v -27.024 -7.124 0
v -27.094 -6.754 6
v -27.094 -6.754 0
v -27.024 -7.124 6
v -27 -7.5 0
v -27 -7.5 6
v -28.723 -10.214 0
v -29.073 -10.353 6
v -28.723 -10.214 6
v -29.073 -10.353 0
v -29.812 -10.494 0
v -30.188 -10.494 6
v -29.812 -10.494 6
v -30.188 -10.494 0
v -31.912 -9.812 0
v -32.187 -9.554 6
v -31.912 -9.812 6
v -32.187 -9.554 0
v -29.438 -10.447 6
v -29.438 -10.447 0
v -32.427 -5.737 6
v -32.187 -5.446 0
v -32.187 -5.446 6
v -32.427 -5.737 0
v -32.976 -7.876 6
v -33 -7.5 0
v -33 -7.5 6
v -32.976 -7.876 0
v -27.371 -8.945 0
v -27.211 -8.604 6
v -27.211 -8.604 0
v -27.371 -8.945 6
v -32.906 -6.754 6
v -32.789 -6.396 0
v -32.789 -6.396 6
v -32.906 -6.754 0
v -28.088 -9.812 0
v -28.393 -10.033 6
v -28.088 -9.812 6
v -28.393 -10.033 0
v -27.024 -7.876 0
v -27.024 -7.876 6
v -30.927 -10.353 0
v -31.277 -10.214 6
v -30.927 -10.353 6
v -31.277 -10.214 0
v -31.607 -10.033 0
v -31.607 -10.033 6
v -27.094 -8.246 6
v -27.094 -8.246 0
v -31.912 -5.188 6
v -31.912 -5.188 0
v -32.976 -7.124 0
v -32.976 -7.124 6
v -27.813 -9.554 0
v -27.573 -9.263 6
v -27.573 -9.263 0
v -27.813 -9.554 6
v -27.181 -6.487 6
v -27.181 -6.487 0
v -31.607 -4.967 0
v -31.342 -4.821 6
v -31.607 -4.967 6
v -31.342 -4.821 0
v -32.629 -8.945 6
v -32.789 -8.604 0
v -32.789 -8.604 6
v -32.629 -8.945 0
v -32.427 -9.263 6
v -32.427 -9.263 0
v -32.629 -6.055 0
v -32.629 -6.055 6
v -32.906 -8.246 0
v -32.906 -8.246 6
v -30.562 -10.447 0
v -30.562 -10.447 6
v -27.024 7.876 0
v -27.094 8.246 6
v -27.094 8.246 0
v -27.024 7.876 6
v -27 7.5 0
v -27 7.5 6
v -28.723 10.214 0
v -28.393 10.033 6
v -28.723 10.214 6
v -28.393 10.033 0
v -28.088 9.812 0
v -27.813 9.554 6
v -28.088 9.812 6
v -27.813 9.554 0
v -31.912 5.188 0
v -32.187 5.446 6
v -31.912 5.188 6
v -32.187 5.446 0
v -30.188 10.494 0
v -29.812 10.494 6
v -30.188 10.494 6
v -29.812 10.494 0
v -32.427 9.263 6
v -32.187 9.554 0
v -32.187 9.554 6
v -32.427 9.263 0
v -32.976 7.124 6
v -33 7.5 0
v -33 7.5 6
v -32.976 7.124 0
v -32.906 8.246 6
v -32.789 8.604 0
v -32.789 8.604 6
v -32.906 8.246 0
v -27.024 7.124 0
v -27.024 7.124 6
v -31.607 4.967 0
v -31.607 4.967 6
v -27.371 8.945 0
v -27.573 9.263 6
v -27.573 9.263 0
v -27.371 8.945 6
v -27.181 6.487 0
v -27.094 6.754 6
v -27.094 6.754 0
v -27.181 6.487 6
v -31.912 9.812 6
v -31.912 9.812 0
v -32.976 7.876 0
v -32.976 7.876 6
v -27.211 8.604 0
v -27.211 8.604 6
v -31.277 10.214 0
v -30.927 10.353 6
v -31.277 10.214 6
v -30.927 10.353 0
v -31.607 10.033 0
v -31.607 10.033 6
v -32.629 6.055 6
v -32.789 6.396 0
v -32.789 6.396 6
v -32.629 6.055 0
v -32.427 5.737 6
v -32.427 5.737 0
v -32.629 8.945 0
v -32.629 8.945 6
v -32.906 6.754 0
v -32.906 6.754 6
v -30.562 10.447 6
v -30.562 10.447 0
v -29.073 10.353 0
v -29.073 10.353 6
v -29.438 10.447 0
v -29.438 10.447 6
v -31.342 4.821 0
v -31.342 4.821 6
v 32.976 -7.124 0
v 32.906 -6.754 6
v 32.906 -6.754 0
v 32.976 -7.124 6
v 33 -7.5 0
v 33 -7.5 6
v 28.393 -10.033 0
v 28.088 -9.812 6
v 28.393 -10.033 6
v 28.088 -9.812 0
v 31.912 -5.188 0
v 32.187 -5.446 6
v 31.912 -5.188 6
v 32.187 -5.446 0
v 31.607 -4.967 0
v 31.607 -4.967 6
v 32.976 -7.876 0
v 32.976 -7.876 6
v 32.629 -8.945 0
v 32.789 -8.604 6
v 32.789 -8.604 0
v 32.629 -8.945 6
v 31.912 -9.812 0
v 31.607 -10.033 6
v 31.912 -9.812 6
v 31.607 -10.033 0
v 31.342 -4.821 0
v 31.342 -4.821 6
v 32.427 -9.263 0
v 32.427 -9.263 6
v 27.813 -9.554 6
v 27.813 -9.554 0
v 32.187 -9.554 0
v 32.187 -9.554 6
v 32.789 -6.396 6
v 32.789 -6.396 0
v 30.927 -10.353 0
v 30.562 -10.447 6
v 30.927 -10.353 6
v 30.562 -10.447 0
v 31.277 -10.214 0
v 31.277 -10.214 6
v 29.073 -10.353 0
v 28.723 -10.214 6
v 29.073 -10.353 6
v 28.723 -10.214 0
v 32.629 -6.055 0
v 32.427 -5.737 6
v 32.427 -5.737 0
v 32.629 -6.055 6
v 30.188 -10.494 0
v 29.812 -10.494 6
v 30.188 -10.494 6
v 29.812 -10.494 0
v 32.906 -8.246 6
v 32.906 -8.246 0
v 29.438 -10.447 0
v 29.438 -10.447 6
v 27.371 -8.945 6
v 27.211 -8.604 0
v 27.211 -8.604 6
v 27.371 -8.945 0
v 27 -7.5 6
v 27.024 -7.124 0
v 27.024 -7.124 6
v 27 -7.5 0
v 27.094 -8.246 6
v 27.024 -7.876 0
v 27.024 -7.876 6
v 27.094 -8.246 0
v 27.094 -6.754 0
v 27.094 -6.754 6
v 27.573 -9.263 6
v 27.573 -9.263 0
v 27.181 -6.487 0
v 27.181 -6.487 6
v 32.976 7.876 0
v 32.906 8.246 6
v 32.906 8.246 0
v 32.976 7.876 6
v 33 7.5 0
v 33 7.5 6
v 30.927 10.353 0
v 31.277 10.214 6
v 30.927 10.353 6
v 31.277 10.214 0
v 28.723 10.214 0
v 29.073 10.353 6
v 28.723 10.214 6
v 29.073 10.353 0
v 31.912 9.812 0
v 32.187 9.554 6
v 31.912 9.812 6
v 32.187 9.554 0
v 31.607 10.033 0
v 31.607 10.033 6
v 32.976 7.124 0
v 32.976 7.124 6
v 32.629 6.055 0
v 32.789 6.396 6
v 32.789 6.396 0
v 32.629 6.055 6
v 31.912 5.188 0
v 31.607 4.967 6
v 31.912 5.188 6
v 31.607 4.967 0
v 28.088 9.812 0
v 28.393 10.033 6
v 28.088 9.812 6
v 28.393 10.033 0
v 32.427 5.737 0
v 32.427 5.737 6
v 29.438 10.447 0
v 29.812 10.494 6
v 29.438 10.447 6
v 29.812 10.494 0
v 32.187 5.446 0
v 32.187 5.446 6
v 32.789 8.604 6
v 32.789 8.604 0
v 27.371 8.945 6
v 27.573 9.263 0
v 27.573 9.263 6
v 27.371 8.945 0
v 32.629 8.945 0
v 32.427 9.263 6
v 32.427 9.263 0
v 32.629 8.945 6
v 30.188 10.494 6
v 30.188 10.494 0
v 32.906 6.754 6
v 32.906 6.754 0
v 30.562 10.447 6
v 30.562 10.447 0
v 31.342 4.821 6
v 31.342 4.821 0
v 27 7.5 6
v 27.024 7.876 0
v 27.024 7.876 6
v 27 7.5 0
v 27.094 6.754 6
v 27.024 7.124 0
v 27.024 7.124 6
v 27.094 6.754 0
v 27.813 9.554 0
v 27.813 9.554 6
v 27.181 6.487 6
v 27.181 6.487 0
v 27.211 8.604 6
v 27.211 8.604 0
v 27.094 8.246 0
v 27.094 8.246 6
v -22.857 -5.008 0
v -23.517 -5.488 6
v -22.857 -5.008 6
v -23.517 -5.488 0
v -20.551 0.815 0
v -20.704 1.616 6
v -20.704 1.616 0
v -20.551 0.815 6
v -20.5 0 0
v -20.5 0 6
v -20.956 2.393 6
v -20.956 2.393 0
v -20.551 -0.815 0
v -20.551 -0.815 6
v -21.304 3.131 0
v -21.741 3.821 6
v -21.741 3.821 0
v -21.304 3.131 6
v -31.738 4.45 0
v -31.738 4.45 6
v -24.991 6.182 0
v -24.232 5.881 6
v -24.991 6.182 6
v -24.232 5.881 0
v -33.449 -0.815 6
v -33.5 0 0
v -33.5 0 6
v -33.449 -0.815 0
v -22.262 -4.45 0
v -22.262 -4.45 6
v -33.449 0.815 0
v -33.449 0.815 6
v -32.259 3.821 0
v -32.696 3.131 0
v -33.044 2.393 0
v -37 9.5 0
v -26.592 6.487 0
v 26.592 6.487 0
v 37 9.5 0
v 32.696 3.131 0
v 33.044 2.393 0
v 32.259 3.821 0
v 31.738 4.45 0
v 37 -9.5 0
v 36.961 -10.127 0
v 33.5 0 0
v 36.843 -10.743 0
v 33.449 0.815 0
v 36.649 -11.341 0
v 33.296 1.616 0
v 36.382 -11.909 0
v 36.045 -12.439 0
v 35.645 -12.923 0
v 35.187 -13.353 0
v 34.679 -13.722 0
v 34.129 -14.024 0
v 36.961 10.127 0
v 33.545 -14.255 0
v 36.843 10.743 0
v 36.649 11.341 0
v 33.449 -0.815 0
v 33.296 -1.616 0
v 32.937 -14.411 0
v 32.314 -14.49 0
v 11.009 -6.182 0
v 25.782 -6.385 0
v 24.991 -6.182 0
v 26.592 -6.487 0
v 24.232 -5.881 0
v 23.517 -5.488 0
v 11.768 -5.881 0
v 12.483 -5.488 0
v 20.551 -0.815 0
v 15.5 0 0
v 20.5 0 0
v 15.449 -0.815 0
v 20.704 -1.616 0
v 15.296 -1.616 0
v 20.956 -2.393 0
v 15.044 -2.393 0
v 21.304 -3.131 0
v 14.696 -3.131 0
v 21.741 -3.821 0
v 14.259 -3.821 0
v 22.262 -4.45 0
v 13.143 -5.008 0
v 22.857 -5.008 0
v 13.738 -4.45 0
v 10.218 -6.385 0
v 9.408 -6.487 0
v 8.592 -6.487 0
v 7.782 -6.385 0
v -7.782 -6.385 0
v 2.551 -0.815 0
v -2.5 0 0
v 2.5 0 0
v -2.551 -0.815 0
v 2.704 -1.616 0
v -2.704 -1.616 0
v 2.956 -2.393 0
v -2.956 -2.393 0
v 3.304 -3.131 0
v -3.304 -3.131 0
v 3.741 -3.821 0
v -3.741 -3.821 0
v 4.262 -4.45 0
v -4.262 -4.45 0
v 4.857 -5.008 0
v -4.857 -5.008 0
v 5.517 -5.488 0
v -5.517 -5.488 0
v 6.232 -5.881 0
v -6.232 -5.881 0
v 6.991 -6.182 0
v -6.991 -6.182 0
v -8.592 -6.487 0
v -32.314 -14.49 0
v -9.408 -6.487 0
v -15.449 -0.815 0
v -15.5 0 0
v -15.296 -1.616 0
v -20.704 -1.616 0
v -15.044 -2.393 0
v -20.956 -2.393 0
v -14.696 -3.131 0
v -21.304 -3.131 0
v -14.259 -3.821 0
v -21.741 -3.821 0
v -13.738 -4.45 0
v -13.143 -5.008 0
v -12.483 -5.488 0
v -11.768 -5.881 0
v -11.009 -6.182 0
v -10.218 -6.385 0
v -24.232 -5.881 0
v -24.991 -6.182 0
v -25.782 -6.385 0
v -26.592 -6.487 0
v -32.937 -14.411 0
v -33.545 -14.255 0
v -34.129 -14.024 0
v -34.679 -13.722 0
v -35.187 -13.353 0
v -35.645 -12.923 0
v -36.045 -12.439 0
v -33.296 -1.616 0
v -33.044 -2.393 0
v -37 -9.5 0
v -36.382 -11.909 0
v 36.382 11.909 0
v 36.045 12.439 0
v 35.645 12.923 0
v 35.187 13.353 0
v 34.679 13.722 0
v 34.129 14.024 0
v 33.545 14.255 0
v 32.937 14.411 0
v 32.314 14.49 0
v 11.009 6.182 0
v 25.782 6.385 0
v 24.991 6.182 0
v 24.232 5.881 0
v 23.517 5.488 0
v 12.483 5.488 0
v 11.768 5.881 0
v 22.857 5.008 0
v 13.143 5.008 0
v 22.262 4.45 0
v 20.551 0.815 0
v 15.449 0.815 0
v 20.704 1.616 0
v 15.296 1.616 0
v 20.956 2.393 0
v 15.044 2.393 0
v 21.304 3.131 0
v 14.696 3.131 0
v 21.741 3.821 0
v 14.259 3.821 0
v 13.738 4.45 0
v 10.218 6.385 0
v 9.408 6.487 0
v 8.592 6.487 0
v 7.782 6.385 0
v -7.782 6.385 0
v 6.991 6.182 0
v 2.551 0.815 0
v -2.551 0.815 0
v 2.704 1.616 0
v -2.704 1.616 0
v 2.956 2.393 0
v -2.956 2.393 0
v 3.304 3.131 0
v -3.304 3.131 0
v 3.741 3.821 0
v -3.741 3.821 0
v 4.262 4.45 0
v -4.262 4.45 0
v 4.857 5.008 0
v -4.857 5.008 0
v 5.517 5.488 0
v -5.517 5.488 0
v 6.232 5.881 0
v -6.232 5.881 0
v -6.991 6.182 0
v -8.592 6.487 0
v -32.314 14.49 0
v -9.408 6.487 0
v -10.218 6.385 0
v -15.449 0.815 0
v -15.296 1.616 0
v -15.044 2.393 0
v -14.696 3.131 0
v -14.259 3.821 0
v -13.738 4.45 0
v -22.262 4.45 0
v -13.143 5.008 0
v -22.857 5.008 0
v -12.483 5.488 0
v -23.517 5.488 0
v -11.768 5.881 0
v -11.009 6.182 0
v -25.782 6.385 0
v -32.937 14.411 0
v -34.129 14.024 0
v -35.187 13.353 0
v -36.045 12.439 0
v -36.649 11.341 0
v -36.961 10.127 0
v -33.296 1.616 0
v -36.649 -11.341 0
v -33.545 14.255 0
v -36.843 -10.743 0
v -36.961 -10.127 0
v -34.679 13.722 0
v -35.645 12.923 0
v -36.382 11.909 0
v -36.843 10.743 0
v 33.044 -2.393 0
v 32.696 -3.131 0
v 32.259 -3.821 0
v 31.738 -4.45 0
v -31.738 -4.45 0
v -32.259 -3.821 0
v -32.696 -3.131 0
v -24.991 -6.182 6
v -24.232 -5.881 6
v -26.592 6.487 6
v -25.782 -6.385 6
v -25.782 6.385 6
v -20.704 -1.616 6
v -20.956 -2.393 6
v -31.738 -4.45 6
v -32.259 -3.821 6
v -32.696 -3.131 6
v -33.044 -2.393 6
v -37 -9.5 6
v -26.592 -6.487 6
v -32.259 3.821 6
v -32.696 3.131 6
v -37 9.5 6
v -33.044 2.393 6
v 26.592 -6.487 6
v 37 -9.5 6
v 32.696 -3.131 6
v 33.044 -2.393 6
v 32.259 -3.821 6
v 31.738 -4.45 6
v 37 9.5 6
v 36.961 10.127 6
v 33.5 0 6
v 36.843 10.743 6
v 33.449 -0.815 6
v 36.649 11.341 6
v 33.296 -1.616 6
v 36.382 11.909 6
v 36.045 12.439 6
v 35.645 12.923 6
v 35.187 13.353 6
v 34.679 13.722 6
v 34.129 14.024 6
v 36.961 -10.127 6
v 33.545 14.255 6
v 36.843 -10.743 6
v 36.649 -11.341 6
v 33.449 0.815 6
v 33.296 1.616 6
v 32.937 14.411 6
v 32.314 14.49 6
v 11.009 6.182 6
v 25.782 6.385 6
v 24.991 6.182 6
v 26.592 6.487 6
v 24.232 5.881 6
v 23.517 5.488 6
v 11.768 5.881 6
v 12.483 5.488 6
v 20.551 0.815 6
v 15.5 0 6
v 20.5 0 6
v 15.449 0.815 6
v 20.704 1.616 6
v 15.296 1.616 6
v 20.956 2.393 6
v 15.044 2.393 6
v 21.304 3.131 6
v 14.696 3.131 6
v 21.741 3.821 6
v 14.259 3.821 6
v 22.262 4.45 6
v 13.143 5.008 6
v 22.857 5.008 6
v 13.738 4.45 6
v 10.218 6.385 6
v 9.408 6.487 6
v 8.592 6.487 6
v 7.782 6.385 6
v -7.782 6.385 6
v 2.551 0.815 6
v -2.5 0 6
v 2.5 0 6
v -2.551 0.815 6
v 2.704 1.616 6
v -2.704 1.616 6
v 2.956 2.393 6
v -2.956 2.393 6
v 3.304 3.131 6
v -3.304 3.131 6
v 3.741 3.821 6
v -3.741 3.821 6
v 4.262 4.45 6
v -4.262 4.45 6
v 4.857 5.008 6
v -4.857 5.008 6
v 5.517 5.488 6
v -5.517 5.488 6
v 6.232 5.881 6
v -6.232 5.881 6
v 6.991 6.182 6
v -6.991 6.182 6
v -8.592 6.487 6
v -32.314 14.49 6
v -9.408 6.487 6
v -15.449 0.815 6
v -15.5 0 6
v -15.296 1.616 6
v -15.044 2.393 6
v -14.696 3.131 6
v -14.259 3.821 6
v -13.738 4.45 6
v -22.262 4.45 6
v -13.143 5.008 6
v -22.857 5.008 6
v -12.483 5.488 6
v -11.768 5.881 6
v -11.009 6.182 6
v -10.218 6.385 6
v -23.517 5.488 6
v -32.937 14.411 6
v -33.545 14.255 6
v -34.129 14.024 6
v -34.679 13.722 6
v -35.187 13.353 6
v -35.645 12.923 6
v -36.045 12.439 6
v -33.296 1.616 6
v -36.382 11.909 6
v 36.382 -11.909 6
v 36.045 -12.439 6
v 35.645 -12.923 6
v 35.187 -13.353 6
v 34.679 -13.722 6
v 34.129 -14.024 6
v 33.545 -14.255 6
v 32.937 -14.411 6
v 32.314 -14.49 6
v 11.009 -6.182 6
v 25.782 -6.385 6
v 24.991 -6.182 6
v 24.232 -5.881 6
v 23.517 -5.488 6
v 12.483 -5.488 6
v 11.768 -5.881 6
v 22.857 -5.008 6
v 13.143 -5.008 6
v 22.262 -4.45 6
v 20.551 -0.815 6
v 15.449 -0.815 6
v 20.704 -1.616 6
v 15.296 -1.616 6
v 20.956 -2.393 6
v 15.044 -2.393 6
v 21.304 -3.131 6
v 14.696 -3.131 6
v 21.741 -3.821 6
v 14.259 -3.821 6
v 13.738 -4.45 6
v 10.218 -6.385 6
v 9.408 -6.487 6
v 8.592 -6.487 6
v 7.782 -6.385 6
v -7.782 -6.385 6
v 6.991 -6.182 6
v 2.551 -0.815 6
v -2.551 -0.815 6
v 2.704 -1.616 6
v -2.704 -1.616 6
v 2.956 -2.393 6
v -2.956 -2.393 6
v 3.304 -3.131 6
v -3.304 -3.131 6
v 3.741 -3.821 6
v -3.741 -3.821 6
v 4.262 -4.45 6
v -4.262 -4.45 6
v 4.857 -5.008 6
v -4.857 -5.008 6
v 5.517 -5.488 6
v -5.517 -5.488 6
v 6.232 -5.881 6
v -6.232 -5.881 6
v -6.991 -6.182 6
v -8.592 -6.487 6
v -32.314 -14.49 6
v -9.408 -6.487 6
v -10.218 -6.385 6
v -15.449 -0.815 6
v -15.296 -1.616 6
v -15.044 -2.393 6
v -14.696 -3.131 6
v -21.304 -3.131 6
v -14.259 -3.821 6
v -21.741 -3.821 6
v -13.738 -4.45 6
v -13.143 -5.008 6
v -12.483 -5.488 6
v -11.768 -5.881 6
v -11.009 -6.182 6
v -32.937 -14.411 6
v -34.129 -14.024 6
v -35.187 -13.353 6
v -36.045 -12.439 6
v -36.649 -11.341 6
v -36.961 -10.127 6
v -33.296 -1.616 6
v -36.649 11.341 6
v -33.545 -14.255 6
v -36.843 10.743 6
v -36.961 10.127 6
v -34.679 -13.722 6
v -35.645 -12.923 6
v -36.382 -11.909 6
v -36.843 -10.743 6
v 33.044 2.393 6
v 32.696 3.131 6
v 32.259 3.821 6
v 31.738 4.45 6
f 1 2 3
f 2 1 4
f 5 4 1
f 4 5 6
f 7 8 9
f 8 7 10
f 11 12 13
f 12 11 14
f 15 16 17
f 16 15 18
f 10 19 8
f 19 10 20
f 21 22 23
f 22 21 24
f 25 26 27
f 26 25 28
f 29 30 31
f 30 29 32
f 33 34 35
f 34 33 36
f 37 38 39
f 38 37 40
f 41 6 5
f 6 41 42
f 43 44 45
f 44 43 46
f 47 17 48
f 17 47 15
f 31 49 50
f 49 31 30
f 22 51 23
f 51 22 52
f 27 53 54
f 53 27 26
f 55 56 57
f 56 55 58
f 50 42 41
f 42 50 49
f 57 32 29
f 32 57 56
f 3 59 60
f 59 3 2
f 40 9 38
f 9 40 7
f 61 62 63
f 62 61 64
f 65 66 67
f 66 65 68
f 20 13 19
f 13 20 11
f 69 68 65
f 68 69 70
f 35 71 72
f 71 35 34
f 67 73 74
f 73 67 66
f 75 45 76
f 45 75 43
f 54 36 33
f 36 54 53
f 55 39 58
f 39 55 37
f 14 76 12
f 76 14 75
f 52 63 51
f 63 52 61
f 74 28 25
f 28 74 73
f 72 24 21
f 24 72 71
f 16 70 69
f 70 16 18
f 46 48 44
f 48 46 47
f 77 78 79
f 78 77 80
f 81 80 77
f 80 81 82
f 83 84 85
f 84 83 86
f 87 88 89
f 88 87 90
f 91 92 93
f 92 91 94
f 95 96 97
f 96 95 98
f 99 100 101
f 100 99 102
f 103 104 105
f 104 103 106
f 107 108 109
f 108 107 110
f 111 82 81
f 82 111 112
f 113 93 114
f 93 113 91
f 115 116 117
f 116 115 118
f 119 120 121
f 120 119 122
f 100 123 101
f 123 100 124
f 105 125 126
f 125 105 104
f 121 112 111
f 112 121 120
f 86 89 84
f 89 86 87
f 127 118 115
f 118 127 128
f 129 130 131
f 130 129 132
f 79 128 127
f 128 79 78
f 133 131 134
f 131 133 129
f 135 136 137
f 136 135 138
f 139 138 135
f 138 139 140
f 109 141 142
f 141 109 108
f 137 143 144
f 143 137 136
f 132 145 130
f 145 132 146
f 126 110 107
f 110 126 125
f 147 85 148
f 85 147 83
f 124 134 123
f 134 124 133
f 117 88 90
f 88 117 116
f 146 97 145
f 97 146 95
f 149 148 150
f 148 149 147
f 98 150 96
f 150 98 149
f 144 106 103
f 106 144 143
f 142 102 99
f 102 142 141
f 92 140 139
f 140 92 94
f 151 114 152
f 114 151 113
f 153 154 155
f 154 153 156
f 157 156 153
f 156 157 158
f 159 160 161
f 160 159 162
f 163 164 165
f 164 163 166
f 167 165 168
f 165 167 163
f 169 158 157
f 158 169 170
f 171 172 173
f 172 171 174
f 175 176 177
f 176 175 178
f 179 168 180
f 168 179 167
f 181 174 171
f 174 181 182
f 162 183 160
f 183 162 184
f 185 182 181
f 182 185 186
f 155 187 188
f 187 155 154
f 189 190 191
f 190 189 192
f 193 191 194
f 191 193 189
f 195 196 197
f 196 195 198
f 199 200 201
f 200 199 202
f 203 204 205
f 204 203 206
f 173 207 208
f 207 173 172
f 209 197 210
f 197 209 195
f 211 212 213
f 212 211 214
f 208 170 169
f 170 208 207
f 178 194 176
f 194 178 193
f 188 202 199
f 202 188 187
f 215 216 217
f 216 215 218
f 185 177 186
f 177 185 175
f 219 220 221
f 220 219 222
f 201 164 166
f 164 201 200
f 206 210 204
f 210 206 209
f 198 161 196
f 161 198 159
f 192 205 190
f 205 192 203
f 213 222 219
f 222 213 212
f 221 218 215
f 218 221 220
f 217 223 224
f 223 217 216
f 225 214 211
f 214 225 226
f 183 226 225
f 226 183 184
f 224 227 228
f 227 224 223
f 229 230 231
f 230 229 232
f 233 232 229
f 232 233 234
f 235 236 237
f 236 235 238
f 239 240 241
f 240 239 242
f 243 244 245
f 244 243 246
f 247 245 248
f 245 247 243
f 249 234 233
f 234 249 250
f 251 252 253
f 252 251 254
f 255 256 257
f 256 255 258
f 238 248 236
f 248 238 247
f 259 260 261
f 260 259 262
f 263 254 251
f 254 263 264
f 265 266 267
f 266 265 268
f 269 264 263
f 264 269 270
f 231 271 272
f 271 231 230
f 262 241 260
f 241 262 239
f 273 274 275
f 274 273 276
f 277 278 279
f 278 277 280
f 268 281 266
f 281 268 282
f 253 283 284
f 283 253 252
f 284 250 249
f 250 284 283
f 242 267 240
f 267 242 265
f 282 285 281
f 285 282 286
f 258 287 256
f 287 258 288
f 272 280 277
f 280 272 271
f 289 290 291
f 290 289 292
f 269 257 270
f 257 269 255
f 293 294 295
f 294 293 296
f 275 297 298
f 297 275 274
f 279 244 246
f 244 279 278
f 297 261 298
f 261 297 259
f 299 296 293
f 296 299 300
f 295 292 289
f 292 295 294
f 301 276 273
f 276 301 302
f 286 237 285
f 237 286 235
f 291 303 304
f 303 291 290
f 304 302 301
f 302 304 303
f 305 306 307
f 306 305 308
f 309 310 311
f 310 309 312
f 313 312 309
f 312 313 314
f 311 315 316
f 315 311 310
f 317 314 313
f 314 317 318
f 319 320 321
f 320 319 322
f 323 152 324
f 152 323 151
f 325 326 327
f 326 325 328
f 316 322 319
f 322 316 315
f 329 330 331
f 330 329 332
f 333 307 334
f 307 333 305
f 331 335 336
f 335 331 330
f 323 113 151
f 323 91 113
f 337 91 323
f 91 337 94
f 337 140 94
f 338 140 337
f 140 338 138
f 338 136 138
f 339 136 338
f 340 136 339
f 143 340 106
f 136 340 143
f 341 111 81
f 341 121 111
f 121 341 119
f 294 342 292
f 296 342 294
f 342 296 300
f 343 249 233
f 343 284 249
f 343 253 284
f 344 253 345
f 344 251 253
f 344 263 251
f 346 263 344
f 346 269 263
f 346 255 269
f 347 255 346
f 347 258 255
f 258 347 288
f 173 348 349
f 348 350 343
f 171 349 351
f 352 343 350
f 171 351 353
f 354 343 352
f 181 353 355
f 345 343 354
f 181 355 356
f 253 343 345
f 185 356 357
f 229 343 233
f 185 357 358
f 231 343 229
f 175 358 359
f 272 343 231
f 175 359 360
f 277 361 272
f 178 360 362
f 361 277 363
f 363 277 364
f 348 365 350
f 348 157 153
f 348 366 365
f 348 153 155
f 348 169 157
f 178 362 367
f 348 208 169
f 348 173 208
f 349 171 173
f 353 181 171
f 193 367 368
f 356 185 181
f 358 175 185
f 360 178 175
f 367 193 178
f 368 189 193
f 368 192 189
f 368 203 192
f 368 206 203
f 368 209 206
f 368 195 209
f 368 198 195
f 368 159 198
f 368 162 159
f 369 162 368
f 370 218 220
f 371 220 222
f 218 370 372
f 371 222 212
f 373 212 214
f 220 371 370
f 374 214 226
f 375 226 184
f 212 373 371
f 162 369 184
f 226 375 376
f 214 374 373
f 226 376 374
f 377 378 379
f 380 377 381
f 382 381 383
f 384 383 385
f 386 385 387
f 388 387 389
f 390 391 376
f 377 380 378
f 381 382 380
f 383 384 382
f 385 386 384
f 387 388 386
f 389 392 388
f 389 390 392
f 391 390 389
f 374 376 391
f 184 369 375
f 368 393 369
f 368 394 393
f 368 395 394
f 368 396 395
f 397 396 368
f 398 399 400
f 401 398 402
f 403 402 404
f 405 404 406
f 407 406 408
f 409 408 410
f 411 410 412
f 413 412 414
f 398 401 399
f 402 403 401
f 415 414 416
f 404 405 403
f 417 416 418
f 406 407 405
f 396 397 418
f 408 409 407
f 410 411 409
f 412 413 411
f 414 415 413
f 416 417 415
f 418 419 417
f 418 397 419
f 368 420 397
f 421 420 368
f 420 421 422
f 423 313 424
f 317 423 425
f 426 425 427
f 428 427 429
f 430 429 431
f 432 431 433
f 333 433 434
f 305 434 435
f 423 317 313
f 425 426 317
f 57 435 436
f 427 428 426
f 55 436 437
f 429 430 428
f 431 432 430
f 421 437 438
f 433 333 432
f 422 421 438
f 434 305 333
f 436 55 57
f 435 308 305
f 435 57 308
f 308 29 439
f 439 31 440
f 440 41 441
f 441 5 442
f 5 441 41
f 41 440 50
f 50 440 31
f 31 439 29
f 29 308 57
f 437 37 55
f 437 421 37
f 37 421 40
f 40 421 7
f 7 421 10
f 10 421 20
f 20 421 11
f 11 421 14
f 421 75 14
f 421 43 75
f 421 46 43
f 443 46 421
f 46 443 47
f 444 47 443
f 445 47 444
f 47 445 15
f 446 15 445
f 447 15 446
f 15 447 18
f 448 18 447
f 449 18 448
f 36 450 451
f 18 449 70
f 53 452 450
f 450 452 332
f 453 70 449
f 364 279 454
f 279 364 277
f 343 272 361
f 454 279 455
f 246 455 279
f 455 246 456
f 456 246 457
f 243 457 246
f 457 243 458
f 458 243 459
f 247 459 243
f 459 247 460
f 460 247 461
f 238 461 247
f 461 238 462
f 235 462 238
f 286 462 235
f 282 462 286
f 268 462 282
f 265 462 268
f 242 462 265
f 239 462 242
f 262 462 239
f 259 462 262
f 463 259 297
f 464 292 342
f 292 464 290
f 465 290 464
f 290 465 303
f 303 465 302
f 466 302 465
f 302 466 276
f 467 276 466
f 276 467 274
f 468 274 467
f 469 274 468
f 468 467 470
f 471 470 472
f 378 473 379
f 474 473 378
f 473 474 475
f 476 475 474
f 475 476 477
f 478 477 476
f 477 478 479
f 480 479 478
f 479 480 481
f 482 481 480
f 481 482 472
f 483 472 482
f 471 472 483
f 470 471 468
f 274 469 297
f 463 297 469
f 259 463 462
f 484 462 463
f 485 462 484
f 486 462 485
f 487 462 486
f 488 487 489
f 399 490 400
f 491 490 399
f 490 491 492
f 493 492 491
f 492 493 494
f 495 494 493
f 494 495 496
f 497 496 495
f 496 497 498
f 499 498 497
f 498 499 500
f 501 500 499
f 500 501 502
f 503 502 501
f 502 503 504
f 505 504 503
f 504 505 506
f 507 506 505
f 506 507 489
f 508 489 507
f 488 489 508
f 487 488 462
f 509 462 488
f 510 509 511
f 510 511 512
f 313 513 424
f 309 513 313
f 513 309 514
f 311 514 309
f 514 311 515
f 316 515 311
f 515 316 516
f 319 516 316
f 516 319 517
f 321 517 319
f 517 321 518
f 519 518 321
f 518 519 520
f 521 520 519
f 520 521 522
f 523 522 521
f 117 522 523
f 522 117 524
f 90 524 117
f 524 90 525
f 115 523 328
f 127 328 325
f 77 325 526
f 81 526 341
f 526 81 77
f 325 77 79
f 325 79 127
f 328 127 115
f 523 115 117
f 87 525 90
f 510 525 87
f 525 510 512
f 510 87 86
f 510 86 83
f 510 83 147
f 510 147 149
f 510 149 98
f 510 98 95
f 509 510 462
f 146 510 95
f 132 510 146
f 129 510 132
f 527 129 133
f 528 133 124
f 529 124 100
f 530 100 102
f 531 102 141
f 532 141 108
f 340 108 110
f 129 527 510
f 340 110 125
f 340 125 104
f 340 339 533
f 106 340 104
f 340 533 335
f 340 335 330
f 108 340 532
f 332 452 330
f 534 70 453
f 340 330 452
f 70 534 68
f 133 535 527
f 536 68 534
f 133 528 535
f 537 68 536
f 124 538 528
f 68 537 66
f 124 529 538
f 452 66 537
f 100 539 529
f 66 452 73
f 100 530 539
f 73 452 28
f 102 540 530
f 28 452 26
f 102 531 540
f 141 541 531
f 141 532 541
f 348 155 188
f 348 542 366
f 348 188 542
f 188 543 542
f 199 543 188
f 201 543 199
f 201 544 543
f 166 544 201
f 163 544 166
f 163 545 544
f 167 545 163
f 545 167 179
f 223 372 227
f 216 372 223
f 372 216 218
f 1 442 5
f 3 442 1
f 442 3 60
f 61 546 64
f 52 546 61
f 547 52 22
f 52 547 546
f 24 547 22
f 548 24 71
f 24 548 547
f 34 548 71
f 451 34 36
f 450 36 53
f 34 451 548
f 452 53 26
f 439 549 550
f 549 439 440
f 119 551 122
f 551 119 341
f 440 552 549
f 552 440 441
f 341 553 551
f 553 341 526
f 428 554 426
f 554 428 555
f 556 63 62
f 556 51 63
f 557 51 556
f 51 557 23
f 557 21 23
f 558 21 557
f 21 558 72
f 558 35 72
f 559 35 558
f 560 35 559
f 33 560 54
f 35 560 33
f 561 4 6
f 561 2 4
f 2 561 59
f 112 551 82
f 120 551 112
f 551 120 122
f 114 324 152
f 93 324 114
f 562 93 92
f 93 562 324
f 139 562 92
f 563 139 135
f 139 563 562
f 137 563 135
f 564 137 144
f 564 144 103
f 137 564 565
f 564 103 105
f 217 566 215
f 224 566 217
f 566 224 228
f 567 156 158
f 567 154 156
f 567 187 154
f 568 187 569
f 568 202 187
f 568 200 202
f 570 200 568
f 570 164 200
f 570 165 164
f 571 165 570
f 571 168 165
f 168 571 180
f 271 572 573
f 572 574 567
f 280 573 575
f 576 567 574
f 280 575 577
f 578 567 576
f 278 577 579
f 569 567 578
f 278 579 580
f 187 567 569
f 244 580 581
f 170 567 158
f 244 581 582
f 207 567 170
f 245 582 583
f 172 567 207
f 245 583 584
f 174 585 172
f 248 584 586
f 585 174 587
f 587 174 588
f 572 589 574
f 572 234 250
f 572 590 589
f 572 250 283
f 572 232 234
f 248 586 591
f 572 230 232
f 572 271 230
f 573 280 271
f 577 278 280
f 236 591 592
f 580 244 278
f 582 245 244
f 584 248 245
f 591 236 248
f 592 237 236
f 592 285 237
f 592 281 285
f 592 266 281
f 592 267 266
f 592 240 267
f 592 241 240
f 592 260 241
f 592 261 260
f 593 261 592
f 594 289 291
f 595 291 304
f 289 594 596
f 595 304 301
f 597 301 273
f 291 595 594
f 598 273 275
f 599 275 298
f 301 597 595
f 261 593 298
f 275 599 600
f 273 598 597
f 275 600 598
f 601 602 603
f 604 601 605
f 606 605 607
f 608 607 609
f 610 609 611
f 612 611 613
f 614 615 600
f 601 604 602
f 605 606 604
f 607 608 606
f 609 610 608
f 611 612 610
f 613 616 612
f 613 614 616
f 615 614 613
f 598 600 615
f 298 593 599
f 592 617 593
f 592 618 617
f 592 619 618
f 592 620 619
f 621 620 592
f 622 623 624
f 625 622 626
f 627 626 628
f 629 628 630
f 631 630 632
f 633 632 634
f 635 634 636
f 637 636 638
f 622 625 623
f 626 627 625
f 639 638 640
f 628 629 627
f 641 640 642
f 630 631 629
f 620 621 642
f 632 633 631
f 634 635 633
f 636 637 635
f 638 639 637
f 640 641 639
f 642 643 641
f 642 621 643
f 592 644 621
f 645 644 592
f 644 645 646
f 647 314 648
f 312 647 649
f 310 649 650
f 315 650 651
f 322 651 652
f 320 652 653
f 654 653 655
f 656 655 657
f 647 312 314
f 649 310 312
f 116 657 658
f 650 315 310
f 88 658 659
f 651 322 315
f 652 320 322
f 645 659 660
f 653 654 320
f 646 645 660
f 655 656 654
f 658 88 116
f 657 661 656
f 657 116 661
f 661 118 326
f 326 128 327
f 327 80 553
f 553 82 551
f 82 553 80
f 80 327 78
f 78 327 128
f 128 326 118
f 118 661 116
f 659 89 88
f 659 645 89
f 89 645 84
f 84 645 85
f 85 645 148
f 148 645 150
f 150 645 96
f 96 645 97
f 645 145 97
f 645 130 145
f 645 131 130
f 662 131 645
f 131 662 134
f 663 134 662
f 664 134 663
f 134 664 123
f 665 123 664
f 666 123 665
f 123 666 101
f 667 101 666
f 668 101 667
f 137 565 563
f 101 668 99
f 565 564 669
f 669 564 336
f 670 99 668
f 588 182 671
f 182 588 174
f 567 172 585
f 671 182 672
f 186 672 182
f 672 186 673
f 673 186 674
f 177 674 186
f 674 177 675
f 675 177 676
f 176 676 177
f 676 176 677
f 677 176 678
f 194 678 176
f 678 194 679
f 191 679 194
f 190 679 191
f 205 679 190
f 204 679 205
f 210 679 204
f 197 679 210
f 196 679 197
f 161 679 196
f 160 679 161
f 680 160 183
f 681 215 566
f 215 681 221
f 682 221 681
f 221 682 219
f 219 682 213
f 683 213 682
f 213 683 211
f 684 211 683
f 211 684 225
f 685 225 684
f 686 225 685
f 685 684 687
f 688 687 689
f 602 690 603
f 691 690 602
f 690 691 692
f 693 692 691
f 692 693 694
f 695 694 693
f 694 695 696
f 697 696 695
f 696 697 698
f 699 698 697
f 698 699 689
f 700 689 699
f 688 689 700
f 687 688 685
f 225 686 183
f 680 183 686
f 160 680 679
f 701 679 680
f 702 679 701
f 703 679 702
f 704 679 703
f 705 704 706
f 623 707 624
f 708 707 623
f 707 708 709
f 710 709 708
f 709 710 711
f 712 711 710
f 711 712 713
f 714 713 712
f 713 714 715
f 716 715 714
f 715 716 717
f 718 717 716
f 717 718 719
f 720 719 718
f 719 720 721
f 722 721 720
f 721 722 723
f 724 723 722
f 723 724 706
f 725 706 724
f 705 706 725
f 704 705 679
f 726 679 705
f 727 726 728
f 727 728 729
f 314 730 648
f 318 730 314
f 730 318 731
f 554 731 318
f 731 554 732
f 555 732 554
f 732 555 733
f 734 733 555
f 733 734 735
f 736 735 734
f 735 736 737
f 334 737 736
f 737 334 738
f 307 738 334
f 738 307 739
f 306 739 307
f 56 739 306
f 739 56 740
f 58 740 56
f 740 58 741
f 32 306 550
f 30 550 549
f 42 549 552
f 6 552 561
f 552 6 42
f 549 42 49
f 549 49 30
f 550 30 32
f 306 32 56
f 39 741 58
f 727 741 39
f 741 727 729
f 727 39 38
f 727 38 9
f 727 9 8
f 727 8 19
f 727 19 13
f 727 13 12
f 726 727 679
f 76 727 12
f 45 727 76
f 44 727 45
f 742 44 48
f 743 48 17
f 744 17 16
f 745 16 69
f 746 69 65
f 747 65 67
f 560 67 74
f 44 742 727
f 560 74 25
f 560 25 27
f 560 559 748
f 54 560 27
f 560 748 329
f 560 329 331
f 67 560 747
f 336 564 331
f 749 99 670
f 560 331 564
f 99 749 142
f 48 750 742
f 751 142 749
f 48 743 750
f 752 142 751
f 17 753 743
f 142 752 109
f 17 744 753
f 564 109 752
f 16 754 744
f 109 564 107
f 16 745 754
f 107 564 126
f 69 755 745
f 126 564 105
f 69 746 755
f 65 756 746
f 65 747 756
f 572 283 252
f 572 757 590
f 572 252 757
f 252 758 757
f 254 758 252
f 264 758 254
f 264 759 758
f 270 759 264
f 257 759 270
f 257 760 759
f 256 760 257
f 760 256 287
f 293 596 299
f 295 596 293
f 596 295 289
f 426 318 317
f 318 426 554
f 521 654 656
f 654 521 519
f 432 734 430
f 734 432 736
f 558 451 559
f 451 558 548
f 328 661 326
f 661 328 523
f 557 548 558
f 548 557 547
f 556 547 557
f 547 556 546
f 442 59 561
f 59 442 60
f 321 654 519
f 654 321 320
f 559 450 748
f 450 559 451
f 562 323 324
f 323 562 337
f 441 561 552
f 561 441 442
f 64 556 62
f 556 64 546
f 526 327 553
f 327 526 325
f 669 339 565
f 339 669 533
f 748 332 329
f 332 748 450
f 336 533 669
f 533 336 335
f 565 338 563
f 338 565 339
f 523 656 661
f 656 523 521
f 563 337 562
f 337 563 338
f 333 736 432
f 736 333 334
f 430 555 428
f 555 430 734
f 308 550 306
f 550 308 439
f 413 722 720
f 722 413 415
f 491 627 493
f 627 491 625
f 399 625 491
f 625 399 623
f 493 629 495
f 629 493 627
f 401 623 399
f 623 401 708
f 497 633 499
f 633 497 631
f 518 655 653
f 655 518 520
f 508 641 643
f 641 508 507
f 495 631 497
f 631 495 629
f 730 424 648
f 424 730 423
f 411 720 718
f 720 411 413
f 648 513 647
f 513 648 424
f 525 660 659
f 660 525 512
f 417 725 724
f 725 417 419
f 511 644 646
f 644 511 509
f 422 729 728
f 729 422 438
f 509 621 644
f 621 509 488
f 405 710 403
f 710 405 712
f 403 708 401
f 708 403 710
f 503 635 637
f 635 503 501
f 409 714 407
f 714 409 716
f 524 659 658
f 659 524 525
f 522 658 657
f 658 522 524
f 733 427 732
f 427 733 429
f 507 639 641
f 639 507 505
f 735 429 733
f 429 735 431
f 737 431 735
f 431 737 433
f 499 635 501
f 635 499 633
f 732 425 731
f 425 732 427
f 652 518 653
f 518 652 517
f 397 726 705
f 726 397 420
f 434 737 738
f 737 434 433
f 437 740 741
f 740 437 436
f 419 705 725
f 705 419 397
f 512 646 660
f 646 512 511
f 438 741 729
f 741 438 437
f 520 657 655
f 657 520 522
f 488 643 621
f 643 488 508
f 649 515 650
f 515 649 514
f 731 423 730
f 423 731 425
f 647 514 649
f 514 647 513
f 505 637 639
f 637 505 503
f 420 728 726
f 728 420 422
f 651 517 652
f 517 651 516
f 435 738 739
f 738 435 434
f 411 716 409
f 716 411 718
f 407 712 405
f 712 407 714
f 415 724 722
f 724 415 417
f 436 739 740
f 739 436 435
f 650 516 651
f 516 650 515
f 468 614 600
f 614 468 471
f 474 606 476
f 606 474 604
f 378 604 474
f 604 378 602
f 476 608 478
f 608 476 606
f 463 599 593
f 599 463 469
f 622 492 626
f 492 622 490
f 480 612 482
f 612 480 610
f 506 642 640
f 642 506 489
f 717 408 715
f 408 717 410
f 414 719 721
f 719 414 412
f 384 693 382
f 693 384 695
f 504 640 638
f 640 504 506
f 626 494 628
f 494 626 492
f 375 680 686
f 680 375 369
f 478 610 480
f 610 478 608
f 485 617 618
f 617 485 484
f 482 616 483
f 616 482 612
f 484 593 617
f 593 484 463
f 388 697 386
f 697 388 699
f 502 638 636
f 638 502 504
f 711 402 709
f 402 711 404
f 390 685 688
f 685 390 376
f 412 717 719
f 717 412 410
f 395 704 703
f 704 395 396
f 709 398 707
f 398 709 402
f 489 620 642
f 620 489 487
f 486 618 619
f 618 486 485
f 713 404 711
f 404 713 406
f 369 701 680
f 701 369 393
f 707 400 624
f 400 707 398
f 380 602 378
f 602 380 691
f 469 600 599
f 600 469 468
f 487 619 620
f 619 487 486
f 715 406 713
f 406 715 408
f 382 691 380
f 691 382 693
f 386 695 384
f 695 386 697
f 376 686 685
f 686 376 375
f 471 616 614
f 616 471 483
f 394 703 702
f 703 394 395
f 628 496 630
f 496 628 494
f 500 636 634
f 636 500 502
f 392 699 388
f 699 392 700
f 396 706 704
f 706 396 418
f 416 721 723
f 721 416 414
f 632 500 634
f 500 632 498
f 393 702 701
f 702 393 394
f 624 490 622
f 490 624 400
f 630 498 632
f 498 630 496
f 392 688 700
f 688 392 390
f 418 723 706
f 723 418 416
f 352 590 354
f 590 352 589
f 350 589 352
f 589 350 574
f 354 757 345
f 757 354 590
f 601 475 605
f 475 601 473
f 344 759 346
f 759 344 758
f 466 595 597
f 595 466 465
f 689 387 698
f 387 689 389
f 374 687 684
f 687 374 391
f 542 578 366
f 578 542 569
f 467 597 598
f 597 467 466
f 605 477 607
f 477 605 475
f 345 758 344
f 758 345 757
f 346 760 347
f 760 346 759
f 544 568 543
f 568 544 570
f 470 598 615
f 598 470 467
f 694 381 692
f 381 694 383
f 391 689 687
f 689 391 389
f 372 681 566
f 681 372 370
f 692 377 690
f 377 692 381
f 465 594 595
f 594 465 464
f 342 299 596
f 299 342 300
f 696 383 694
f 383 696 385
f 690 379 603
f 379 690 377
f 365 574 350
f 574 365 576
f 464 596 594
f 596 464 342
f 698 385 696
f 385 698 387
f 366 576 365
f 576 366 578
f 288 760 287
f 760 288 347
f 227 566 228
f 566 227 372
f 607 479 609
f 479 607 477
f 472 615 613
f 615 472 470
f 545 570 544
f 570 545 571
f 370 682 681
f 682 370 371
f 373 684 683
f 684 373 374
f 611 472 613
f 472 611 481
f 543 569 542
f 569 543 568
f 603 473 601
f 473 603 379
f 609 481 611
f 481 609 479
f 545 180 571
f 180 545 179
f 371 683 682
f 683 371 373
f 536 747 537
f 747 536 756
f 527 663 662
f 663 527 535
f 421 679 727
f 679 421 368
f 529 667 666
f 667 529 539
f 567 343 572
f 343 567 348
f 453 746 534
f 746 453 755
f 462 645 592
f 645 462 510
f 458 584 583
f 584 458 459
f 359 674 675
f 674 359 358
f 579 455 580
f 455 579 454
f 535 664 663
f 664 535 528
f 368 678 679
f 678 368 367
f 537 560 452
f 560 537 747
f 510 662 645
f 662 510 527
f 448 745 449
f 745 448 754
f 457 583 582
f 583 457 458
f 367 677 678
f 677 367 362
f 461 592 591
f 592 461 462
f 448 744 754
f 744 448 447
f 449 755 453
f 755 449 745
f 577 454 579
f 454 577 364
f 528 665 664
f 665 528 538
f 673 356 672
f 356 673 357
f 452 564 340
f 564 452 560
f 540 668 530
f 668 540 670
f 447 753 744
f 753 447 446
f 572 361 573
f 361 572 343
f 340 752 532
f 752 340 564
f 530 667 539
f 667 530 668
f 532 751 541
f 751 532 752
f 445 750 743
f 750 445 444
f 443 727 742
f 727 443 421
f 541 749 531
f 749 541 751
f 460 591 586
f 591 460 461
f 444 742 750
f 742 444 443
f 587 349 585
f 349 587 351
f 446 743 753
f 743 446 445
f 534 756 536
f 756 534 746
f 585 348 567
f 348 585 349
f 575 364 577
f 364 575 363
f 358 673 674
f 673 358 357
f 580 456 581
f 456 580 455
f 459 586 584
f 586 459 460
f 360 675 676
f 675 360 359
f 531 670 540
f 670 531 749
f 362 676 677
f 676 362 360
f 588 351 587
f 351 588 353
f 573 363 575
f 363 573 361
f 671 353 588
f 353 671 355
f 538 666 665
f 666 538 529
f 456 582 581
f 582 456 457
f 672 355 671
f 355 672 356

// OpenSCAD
$fn = 50;


difference() {
	union() {
		hull() {
			translate(v = [-32.0000000000, 9.5000000000, 0]) {
				cylinder(h = 6, r = 5);
			}
			translate(v = [32.0000000000, 9.5000000000, 0]) {
				cylinder(h = 6, r = 5);
			}
			translate(v = [-32.0000000000, -9.5000000000, 0]) {
				cylinder(h = 6, r = 5);
			}
			translate(v = [32.0000000000, -9.5000000000, 0]) {
				cylinder(h = 6, r = 5);
			}
		}
	}
	union() {
		#translate(v = [-30.0000000000, -7.5000000000, -100.0000000000]) {
			cylinder(h = 200, r = 3.0000000000);
		}
		#translate(v = [-30.0000000000, 7.5000000000, -100.0000000000]) {
			cylinder(h = 200, r = 3.0000000000);
		}
		#translate(v = [30.0000000000, -7.5000000000, -100.0000000000]) {
			cylinder(h = 200, r = 3.0000000000);
		}
		#translate(v = [30.0000000000, 7.5000000000, -100.0000000000]) {
			cylinder(h = 200, r = 3.0000000000);
		}
		#translate(v = [-27.0000000000, 0, 0]) {
			cylinder(h = 6, r = 6.5000000000);
		}
		#translate(v = [-9.0000000000, 0, 0]) {
			cylinder(h = 6, r = 6.5000000000);
		}
		#translate(v = [9.0000000000, 0, 0]) {
			cylinder(h = 6, r = 6.5000000000);
		}
		#translate(v = [27.0000000000, 0, 0]) {
			cylinder(h = 6, r = 6.5000000000);
		}
	}
}
